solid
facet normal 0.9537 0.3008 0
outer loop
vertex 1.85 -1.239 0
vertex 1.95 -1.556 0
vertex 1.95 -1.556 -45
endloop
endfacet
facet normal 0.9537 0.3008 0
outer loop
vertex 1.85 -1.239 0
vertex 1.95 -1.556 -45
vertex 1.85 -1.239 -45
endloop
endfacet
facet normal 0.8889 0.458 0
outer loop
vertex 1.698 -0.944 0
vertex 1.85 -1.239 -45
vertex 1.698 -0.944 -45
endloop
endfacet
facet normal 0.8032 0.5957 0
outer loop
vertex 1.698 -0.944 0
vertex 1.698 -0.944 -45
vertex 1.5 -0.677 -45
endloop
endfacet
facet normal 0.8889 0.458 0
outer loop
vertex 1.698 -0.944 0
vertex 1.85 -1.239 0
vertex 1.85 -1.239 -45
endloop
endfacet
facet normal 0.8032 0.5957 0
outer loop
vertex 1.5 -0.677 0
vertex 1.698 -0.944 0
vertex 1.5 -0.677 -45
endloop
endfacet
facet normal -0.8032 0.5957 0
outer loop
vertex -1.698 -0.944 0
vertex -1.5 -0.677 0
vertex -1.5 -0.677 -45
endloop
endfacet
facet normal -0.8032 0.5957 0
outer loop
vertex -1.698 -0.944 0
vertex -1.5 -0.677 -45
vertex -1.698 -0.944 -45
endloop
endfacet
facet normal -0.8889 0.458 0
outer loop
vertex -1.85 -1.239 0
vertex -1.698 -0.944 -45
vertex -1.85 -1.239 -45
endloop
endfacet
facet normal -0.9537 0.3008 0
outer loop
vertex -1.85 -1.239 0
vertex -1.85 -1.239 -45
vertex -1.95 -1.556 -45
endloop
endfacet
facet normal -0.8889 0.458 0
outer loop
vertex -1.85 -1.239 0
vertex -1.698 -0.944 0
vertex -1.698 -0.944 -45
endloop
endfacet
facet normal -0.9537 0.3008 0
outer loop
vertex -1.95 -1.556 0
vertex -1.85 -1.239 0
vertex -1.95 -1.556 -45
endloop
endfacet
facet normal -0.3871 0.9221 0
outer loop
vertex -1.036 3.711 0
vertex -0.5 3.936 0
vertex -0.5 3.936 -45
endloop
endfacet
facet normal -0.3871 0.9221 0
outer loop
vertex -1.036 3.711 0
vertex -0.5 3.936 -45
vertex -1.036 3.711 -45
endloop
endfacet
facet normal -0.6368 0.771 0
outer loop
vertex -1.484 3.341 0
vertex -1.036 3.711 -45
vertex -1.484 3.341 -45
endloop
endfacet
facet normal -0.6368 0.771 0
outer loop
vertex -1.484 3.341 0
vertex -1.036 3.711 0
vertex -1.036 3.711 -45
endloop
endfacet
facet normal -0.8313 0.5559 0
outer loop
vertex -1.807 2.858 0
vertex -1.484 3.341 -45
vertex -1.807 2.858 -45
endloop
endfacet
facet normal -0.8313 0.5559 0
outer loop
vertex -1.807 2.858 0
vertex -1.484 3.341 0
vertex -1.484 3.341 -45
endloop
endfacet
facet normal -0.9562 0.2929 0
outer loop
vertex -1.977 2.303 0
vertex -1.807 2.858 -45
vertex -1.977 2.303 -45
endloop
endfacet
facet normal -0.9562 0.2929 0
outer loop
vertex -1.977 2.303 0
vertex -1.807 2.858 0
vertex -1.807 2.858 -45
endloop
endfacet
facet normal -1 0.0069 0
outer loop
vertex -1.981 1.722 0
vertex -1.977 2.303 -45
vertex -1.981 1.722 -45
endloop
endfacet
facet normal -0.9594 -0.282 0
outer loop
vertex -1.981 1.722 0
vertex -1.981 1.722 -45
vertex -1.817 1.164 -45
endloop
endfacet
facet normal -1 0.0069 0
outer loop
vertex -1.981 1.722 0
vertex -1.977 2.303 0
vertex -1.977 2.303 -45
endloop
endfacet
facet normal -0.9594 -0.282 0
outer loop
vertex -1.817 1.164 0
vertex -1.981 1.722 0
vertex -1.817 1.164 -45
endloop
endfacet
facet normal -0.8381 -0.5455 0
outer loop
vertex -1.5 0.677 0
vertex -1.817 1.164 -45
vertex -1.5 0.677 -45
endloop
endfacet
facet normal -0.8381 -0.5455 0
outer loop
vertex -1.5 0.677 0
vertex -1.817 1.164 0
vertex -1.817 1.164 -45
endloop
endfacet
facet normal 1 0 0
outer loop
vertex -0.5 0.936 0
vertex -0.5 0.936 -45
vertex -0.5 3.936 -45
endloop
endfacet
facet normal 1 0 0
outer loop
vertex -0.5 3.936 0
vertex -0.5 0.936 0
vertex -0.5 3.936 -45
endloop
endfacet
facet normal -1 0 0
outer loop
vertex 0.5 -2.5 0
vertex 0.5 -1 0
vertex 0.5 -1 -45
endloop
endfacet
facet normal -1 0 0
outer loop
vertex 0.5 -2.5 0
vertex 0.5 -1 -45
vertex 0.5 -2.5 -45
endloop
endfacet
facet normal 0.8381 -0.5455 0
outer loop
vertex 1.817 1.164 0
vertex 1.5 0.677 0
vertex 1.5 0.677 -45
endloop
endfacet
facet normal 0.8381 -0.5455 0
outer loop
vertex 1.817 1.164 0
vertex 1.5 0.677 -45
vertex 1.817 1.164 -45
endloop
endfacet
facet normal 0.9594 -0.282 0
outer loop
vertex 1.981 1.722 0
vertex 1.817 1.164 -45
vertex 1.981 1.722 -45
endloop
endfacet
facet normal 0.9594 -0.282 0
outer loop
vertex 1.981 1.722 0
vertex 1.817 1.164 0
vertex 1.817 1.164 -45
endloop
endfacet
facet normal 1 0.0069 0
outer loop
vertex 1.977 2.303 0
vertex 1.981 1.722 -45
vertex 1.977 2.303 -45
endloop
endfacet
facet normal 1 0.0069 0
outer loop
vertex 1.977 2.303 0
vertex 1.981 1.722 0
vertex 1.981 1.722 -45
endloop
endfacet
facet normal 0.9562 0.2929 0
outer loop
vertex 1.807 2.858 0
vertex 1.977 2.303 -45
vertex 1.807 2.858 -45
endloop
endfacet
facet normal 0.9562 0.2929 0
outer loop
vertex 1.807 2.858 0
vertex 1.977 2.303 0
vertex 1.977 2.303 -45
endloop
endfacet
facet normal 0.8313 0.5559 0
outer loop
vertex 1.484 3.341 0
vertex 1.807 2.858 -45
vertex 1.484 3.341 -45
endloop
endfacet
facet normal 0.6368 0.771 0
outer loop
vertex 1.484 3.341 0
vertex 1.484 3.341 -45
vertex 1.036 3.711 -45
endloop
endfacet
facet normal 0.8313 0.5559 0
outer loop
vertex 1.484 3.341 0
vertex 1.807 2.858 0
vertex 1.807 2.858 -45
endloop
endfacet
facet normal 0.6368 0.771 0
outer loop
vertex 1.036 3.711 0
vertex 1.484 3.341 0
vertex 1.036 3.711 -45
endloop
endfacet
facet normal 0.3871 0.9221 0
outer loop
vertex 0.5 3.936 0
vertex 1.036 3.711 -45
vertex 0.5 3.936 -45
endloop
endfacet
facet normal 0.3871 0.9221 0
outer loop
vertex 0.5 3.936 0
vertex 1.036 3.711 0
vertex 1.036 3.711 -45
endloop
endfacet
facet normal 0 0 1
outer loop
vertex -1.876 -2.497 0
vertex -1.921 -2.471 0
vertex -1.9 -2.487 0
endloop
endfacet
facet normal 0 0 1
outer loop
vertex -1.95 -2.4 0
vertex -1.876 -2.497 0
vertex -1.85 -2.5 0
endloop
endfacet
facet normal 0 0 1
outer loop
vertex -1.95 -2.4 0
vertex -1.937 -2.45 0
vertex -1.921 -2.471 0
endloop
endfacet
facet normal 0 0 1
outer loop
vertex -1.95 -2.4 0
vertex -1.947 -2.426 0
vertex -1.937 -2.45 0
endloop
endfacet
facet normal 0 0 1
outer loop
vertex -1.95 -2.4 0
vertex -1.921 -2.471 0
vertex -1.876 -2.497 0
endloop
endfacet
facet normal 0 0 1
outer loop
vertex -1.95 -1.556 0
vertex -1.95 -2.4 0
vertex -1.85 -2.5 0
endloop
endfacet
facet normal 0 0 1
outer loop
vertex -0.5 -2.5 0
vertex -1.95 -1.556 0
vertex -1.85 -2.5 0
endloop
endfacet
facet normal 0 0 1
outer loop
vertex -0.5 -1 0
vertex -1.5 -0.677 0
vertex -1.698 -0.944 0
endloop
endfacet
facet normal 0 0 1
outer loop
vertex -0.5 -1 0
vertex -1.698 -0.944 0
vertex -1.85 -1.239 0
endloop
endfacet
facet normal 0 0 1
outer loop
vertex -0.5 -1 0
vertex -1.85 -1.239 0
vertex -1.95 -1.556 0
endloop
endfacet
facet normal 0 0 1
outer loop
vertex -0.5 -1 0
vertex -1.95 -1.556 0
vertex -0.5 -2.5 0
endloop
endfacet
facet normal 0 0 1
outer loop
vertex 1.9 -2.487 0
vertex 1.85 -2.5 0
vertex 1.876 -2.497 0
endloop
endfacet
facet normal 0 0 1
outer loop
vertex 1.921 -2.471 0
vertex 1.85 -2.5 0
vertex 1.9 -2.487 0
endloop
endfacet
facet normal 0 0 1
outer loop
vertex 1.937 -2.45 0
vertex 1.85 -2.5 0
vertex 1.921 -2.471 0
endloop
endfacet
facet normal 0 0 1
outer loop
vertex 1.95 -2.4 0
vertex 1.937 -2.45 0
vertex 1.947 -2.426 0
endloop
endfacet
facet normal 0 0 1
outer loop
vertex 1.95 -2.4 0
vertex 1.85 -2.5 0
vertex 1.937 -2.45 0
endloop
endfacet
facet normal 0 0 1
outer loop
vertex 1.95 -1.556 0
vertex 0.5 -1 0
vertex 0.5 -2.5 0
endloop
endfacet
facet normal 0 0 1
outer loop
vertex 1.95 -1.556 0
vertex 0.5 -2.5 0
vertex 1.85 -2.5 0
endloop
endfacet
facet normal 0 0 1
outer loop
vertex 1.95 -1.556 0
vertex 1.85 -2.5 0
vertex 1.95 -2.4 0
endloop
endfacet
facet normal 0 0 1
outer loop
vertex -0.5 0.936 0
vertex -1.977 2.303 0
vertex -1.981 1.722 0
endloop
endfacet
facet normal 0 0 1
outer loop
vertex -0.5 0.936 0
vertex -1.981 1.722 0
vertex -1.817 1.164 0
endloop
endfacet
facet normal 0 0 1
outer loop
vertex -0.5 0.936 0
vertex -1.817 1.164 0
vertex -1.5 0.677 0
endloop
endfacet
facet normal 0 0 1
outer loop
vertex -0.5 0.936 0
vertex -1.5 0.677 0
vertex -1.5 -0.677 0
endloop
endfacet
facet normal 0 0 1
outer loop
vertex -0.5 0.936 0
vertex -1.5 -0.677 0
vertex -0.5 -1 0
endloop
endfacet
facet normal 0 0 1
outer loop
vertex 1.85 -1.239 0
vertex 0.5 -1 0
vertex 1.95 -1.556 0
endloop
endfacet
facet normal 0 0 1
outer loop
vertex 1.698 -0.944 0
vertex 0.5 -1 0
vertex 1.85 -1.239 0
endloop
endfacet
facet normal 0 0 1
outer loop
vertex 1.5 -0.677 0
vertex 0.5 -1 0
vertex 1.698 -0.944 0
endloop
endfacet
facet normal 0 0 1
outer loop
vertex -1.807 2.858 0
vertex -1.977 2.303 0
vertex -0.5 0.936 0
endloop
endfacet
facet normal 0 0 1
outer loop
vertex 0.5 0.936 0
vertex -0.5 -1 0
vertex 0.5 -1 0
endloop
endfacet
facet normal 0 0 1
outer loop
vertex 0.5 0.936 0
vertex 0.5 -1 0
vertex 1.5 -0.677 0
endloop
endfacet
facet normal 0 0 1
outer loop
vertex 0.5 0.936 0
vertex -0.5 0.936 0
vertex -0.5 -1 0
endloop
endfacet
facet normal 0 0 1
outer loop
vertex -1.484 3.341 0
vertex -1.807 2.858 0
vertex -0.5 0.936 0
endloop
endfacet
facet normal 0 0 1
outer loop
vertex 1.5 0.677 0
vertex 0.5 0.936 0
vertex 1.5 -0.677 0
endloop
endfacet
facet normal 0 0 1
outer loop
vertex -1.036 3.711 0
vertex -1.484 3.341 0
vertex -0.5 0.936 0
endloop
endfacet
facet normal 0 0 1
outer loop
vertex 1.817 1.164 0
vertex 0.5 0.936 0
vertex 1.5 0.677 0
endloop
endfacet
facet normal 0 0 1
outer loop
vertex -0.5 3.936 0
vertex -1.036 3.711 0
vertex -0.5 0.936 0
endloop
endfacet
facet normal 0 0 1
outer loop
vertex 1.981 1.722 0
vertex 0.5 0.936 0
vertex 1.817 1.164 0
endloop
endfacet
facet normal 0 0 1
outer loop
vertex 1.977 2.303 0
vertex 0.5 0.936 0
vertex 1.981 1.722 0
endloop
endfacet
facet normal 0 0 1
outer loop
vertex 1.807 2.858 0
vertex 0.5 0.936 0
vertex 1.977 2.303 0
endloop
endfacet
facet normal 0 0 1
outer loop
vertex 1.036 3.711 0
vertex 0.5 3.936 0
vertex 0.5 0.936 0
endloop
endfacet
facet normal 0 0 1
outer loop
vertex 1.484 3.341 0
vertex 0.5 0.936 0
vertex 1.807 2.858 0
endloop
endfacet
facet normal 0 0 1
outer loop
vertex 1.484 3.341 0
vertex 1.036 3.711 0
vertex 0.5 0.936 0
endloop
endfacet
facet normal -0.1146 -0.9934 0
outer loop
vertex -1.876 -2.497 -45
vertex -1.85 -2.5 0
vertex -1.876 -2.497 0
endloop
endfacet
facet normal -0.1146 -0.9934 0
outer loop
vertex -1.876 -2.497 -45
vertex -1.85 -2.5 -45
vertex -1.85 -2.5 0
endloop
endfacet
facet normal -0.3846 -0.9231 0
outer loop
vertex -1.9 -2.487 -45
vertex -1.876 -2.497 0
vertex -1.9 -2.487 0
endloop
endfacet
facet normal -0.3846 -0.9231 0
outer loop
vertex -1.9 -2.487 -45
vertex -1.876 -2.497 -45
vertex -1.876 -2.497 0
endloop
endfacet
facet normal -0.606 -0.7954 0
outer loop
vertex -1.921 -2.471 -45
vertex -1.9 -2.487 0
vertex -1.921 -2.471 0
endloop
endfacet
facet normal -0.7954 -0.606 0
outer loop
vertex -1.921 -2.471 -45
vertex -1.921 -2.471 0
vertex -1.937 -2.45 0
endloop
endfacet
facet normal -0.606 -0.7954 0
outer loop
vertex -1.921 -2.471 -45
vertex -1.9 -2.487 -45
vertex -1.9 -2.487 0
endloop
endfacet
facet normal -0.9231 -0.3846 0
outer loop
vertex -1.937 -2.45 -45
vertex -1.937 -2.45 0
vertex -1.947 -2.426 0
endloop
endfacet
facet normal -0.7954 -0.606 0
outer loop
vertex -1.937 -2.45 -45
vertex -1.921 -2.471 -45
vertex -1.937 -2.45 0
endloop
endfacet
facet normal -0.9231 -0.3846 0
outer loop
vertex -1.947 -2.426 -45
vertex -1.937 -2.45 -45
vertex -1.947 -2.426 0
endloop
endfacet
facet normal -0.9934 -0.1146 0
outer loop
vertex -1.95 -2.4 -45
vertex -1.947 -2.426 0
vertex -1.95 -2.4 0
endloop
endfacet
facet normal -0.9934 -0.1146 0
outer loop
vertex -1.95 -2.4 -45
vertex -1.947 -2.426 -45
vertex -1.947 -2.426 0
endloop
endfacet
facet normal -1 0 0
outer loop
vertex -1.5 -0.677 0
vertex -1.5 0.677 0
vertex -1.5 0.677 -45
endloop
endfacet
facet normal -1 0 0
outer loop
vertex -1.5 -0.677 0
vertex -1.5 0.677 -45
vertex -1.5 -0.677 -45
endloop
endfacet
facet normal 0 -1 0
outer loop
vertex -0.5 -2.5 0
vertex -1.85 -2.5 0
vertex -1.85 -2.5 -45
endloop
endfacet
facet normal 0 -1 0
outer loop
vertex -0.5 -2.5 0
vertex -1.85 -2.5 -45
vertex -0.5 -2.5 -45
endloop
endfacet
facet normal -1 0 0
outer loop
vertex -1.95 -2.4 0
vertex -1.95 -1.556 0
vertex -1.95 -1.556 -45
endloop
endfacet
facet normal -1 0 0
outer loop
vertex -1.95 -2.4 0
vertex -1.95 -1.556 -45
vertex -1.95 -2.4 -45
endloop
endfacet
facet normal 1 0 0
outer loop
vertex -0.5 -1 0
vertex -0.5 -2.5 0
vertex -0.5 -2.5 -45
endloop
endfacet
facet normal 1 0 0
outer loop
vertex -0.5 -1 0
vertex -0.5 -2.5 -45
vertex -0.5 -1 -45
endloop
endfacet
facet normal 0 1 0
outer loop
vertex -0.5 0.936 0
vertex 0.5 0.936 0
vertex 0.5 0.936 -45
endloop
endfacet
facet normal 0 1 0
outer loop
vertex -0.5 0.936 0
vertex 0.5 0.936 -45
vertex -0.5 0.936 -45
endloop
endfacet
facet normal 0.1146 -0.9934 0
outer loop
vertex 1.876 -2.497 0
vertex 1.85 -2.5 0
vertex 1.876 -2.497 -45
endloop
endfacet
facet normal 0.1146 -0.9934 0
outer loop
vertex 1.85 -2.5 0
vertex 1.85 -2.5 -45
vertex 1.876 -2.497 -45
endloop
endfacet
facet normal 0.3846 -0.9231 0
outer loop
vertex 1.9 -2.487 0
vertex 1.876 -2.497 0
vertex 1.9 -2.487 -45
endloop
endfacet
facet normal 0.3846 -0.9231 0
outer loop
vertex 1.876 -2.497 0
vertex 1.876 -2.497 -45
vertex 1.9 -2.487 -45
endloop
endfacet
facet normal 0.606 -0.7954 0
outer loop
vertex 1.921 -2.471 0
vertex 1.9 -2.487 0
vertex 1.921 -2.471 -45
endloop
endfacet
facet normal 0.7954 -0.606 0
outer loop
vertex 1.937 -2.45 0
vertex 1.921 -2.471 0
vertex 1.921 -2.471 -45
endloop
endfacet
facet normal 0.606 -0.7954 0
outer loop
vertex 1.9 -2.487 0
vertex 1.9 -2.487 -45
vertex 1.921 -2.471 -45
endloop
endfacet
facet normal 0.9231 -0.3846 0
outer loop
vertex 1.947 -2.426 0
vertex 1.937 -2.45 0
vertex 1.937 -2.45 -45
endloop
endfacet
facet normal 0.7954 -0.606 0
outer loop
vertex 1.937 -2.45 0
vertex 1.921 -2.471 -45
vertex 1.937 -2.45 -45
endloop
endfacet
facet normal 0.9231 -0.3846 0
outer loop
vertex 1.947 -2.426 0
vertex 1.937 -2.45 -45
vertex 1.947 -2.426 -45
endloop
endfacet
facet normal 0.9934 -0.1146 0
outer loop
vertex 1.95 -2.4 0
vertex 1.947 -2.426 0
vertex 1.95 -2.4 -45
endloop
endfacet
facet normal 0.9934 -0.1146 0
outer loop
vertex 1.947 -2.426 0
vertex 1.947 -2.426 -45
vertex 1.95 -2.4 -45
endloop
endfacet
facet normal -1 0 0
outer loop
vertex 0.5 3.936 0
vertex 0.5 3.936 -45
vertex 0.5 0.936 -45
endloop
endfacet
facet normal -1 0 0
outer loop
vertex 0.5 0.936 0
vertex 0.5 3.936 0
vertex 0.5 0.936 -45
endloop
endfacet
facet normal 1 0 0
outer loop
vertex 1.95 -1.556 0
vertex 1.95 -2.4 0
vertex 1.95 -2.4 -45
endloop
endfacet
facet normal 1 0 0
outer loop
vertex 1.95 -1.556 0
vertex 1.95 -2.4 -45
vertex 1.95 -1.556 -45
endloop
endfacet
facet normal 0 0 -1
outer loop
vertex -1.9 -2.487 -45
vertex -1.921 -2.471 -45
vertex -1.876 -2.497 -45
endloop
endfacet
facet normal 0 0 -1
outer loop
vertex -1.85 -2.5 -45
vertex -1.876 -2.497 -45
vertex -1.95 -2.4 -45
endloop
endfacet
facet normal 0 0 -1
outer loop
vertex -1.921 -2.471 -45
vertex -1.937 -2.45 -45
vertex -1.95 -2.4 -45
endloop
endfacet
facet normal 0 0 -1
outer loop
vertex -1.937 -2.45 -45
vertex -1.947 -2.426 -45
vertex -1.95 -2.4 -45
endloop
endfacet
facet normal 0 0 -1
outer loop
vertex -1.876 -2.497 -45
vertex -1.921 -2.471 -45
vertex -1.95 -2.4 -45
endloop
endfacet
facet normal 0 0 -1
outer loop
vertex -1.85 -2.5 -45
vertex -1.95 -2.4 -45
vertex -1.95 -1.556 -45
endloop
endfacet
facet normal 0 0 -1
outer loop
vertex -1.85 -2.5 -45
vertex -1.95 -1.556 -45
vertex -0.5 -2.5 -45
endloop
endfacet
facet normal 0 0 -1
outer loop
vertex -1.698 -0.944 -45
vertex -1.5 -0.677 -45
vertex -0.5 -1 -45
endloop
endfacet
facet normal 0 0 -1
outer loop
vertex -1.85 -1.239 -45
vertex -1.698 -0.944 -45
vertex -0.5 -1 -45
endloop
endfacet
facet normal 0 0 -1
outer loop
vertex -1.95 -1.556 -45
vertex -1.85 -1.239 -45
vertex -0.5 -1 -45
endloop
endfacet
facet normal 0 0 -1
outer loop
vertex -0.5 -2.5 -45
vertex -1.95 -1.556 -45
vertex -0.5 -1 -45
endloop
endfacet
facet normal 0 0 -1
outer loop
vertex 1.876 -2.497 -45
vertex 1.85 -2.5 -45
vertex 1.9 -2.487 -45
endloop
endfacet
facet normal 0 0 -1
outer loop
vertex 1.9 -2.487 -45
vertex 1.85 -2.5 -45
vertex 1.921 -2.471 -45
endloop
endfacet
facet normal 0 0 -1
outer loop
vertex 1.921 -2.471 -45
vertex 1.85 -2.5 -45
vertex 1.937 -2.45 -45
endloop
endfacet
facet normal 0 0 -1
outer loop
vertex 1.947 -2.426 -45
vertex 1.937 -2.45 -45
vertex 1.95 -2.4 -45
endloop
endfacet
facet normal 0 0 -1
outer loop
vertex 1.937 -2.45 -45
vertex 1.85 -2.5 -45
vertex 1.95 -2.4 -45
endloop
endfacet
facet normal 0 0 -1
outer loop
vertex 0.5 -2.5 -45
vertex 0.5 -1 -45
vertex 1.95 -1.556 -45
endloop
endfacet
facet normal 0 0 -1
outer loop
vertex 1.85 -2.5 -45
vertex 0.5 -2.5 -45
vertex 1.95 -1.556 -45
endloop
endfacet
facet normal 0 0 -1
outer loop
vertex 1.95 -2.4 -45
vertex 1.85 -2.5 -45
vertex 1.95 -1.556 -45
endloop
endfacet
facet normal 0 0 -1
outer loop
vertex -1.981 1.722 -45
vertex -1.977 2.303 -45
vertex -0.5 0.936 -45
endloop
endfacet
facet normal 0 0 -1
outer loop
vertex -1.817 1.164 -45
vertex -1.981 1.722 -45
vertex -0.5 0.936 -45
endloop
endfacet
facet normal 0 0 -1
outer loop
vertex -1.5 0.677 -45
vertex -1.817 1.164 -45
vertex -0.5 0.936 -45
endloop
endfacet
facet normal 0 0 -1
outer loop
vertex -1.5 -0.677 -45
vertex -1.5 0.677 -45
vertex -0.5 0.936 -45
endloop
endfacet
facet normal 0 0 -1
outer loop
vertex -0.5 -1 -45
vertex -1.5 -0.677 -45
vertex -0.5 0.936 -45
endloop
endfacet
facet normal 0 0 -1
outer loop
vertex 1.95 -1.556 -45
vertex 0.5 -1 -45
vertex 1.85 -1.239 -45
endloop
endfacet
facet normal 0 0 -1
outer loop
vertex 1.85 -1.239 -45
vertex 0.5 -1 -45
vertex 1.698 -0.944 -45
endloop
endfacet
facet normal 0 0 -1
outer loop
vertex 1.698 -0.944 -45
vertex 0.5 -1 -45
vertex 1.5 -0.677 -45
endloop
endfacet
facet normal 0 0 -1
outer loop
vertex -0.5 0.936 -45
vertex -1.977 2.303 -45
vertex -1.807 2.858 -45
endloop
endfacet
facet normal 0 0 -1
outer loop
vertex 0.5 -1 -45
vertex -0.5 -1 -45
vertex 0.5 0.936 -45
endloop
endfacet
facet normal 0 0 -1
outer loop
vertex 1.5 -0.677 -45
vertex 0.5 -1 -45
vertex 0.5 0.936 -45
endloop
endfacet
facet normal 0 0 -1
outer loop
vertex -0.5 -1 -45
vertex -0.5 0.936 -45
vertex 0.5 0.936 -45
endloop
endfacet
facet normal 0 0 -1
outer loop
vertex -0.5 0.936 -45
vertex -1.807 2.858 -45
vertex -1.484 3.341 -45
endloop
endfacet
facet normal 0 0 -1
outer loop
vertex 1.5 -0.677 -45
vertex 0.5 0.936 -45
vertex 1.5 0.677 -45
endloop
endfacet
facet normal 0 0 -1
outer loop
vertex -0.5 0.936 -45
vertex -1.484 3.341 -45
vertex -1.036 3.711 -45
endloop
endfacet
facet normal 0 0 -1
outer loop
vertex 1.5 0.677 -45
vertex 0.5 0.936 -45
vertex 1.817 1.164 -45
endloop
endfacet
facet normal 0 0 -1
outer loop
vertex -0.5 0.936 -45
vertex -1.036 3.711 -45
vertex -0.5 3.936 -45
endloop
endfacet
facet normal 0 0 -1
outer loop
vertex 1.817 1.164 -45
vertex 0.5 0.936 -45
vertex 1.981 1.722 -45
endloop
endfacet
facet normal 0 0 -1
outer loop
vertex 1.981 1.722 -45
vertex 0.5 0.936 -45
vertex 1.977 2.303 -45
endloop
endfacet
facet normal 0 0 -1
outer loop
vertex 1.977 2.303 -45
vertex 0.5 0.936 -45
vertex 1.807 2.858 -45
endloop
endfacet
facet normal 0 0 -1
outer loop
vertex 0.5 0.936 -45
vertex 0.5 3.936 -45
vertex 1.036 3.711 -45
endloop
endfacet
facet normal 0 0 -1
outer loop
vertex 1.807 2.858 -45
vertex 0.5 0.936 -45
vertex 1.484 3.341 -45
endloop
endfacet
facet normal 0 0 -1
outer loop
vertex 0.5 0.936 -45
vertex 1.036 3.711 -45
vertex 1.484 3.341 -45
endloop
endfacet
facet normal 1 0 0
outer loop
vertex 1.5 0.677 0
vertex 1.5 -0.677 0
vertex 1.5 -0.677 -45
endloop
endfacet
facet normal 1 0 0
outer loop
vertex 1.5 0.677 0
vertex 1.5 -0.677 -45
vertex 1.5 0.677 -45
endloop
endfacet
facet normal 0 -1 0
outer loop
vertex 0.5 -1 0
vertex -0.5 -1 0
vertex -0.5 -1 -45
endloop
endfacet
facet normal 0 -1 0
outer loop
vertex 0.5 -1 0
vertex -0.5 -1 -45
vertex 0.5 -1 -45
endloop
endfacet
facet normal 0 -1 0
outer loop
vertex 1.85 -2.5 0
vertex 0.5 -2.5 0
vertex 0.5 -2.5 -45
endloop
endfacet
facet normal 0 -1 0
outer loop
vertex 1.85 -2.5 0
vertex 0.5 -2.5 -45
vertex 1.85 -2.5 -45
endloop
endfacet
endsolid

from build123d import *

# Parameters (mm, degrees)
EXTRUDE_1_DEPTH = 45
FILLET_1_R      = 0.1


with BuildPart() as part:
    # 草图1 → 凸台-拉伸1 (new body)
    with BuildSketch(Plane.XY):
        with BuildLine():
            Line((-1.95, -2.5), (-0.5, -2.5))
            Line((-0.5, -2.5), (-0.5, -1))
            Line((-0.5, -1), (0.5, -1))
            Line((0.5, -1), (0.5, -2.5))
            Line((0.5, -2.5), (1.95, -2.5))
            Line((1.95, -2.5), (1.95, -1.555590279))
            ThreePointArc((1.95, -1.555590279), (1.780042303, -1.088161527), (1.5, -0.677124344))
            Line((1.5, -0.677124344), (1.5, 0.677124344))
            ThreePointArc((1.5, 0.677124344), (1.912032648, 2.586626929), (0.5, 3.936491673))
            Line((0.5, 3.936491673), (0.5, 0.936491673))
            Line((0.5, 0.936491673), (-0.5, 0.936491673))
            Line((-0.5, 0.936491673), (-0.5, 3.936491673))
            ThreePointArc((-0.5, 3.936491673), (-1.912032648, 2.586626929), (-1.5, 0.677124344))
            Line((-1.5, 0.677124344), (-1.5, -0.677124344))
            ThreePointArc((-1.5, -0.677124344), (-1.780042303, -1.088161527), (-1.95, -1.555590279))
            Line((-1.95, -1.555590279), (-1.95, -2.5))
        make_face()
    extrude(amount=-EXTRUDE_1_DEPTH)

    # 圆角1
    fillet_1_edges = [part.edges().sort_by_distance(p)[0] for p in [
        (1.95, -2.5, -22.5),
        (-1.95, -2.5, -22.5),
    ]]
    fillet(fillet_1_edges, radius=FILLET_1_R)


solid = part.part
